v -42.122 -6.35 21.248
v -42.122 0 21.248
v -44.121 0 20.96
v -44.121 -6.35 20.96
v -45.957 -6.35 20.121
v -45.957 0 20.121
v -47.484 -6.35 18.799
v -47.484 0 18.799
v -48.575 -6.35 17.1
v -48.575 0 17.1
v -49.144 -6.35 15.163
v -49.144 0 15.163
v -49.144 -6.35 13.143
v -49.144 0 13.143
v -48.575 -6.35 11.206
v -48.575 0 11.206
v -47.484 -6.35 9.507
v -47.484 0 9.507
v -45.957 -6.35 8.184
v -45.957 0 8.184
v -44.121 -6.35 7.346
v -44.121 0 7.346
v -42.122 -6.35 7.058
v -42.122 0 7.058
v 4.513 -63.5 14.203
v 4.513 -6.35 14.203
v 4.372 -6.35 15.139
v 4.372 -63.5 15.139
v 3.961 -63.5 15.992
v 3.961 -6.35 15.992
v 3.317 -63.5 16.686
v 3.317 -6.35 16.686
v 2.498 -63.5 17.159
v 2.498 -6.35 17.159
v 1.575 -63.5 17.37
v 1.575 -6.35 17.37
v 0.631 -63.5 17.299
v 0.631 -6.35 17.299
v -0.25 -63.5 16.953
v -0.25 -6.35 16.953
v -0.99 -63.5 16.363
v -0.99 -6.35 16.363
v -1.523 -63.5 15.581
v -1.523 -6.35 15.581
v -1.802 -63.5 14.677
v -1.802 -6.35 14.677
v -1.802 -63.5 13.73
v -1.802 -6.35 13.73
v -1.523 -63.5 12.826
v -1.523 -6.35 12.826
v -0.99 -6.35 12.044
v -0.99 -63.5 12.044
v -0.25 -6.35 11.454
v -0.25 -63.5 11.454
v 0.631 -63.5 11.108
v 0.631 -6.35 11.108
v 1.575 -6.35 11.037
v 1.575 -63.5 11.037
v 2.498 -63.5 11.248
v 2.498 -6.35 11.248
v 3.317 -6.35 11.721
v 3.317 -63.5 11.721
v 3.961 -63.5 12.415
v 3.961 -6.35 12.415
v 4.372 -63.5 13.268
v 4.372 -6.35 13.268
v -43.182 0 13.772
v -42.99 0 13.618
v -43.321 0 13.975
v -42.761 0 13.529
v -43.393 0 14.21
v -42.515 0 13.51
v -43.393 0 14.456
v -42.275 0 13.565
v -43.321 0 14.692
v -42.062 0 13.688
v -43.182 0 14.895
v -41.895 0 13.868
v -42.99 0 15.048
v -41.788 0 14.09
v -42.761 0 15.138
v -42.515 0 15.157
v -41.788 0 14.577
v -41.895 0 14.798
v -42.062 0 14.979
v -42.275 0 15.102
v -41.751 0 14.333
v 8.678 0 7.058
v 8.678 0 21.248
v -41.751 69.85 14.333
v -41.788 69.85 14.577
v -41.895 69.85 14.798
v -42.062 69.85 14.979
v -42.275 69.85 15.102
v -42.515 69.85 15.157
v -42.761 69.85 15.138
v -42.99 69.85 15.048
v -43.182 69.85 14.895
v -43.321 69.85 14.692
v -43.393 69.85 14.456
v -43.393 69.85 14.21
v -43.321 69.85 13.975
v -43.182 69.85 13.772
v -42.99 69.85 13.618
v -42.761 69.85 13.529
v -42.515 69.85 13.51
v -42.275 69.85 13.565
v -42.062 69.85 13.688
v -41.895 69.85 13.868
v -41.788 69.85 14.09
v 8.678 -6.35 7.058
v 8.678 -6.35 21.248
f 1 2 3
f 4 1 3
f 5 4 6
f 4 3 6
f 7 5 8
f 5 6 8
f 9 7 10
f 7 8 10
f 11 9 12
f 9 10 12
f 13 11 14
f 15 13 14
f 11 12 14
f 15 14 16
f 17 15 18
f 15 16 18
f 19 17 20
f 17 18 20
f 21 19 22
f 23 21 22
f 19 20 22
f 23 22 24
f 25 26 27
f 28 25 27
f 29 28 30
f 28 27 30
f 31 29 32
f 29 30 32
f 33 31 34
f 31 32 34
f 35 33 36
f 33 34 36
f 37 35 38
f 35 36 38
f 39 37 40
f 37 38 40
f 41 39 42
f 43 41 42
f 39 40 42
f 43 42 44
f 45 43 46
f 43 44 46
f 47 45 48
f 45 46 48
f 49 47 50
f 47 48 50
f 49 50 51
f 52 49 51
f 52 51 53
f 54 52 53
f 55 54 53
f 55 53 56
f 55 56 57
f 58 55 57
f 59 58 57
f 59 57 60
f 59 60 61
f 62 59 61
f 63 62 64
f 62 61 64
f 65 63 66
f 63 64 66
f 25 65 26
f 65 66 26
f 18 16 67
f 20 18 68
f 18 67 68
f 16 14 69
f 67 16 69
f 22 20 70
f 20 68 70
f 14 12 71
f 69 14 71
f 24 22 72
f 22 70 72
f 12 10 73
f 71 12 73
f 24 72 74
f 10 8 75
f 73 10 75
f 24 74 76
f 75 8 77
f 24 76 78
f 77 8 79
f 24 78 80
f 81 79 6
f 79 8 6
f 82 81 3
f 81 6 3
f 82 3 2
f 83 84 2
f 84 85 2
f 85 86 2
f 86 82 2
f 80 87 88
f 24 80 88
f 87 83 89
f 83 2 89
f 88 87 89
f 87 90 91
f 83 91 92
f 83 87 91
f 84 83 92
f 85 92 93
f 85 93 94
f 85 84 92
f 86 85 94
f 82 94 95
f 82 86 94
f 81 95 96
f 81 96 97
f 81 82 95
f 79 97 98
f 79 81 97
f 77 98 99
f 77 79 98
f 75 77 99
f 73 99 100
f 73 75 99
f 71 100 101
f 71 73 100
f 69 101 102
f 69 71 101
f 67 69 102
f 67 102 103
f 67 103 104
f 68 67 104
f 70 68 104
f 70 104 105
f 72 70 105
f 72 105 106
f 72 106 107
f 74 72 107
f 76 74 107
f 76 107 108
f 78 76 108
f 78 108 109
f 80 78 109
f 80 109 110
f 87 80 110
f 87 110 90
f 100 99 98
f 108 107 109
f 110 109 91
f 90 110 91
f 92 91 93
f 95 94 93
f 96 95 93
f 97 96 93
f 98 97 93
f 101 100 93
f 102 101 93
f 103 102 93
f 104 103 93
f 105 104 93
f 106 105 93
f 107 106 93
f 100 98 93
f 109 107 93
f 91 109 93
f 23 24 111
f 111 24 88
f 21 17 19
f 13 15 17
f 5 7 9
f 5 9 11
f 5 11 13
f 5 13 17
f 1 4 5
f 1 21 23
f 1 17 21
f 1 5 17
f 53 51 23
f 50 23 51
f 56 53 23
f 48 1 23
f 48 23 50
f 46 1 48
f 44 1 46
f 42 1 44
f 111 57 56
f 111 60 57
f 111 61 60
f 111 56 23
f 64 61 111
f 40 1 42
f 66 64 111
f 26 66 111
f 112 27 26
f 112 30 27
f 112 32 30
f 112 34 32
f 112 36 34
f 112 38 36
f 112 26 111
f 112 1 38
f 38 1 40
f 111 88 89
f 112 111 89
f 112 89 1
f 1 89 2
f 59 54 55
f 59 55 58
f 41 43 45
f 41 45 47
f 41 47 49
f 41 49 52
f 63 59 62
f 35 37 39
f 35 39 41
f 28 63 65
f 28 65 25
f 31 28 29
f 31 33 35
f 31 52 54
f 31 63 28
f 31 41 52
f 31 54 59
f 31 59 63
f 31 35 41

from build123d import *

# Parameters (mm, degrees)
F1_DEPTH = 6.35
F5_R     = 0.8255
F6_DEPTH = 76.2
F4_R     = 3.175
F7_DEPTH = 57.15


with BuildPart() as f1:
    # F0 (on Front) → F1 (new body)
    with BuildSketch(Plane.XZ):
        with BuildLine():
            Line((8.678272, 21.247713), (-42.121728, 21.247713))
            ThreePointArc((-42.121728, 21.247713), (-49.216529, 14.152912), (-42.121728, 7.058111))
            Line((-42.121728, 7.058111), (8.678272, 7.058111))
            Line((8.678272, 7.058111), (8.678272, 21.247713))
        make_face()
    extrude(amount=F1_DEPTH)

    # F5 (on face) → F6 (join)
    with BuildSketch(Plane.XZ.offset(6.35)):
        with Locations((-42.576857, 14.333389)):
            Circle(F5_R)
    extrude(amount=-F6_DEPTH)

    # F4 (on face) → F7 (join)
    with BuildSketch(Plane.XZ.offset(6.35)):
        with Locations((1.337771, 14.203422)):
            Circle(F4_R)
    extrude(amount=F7_DEPTH)


solid = f1.part
